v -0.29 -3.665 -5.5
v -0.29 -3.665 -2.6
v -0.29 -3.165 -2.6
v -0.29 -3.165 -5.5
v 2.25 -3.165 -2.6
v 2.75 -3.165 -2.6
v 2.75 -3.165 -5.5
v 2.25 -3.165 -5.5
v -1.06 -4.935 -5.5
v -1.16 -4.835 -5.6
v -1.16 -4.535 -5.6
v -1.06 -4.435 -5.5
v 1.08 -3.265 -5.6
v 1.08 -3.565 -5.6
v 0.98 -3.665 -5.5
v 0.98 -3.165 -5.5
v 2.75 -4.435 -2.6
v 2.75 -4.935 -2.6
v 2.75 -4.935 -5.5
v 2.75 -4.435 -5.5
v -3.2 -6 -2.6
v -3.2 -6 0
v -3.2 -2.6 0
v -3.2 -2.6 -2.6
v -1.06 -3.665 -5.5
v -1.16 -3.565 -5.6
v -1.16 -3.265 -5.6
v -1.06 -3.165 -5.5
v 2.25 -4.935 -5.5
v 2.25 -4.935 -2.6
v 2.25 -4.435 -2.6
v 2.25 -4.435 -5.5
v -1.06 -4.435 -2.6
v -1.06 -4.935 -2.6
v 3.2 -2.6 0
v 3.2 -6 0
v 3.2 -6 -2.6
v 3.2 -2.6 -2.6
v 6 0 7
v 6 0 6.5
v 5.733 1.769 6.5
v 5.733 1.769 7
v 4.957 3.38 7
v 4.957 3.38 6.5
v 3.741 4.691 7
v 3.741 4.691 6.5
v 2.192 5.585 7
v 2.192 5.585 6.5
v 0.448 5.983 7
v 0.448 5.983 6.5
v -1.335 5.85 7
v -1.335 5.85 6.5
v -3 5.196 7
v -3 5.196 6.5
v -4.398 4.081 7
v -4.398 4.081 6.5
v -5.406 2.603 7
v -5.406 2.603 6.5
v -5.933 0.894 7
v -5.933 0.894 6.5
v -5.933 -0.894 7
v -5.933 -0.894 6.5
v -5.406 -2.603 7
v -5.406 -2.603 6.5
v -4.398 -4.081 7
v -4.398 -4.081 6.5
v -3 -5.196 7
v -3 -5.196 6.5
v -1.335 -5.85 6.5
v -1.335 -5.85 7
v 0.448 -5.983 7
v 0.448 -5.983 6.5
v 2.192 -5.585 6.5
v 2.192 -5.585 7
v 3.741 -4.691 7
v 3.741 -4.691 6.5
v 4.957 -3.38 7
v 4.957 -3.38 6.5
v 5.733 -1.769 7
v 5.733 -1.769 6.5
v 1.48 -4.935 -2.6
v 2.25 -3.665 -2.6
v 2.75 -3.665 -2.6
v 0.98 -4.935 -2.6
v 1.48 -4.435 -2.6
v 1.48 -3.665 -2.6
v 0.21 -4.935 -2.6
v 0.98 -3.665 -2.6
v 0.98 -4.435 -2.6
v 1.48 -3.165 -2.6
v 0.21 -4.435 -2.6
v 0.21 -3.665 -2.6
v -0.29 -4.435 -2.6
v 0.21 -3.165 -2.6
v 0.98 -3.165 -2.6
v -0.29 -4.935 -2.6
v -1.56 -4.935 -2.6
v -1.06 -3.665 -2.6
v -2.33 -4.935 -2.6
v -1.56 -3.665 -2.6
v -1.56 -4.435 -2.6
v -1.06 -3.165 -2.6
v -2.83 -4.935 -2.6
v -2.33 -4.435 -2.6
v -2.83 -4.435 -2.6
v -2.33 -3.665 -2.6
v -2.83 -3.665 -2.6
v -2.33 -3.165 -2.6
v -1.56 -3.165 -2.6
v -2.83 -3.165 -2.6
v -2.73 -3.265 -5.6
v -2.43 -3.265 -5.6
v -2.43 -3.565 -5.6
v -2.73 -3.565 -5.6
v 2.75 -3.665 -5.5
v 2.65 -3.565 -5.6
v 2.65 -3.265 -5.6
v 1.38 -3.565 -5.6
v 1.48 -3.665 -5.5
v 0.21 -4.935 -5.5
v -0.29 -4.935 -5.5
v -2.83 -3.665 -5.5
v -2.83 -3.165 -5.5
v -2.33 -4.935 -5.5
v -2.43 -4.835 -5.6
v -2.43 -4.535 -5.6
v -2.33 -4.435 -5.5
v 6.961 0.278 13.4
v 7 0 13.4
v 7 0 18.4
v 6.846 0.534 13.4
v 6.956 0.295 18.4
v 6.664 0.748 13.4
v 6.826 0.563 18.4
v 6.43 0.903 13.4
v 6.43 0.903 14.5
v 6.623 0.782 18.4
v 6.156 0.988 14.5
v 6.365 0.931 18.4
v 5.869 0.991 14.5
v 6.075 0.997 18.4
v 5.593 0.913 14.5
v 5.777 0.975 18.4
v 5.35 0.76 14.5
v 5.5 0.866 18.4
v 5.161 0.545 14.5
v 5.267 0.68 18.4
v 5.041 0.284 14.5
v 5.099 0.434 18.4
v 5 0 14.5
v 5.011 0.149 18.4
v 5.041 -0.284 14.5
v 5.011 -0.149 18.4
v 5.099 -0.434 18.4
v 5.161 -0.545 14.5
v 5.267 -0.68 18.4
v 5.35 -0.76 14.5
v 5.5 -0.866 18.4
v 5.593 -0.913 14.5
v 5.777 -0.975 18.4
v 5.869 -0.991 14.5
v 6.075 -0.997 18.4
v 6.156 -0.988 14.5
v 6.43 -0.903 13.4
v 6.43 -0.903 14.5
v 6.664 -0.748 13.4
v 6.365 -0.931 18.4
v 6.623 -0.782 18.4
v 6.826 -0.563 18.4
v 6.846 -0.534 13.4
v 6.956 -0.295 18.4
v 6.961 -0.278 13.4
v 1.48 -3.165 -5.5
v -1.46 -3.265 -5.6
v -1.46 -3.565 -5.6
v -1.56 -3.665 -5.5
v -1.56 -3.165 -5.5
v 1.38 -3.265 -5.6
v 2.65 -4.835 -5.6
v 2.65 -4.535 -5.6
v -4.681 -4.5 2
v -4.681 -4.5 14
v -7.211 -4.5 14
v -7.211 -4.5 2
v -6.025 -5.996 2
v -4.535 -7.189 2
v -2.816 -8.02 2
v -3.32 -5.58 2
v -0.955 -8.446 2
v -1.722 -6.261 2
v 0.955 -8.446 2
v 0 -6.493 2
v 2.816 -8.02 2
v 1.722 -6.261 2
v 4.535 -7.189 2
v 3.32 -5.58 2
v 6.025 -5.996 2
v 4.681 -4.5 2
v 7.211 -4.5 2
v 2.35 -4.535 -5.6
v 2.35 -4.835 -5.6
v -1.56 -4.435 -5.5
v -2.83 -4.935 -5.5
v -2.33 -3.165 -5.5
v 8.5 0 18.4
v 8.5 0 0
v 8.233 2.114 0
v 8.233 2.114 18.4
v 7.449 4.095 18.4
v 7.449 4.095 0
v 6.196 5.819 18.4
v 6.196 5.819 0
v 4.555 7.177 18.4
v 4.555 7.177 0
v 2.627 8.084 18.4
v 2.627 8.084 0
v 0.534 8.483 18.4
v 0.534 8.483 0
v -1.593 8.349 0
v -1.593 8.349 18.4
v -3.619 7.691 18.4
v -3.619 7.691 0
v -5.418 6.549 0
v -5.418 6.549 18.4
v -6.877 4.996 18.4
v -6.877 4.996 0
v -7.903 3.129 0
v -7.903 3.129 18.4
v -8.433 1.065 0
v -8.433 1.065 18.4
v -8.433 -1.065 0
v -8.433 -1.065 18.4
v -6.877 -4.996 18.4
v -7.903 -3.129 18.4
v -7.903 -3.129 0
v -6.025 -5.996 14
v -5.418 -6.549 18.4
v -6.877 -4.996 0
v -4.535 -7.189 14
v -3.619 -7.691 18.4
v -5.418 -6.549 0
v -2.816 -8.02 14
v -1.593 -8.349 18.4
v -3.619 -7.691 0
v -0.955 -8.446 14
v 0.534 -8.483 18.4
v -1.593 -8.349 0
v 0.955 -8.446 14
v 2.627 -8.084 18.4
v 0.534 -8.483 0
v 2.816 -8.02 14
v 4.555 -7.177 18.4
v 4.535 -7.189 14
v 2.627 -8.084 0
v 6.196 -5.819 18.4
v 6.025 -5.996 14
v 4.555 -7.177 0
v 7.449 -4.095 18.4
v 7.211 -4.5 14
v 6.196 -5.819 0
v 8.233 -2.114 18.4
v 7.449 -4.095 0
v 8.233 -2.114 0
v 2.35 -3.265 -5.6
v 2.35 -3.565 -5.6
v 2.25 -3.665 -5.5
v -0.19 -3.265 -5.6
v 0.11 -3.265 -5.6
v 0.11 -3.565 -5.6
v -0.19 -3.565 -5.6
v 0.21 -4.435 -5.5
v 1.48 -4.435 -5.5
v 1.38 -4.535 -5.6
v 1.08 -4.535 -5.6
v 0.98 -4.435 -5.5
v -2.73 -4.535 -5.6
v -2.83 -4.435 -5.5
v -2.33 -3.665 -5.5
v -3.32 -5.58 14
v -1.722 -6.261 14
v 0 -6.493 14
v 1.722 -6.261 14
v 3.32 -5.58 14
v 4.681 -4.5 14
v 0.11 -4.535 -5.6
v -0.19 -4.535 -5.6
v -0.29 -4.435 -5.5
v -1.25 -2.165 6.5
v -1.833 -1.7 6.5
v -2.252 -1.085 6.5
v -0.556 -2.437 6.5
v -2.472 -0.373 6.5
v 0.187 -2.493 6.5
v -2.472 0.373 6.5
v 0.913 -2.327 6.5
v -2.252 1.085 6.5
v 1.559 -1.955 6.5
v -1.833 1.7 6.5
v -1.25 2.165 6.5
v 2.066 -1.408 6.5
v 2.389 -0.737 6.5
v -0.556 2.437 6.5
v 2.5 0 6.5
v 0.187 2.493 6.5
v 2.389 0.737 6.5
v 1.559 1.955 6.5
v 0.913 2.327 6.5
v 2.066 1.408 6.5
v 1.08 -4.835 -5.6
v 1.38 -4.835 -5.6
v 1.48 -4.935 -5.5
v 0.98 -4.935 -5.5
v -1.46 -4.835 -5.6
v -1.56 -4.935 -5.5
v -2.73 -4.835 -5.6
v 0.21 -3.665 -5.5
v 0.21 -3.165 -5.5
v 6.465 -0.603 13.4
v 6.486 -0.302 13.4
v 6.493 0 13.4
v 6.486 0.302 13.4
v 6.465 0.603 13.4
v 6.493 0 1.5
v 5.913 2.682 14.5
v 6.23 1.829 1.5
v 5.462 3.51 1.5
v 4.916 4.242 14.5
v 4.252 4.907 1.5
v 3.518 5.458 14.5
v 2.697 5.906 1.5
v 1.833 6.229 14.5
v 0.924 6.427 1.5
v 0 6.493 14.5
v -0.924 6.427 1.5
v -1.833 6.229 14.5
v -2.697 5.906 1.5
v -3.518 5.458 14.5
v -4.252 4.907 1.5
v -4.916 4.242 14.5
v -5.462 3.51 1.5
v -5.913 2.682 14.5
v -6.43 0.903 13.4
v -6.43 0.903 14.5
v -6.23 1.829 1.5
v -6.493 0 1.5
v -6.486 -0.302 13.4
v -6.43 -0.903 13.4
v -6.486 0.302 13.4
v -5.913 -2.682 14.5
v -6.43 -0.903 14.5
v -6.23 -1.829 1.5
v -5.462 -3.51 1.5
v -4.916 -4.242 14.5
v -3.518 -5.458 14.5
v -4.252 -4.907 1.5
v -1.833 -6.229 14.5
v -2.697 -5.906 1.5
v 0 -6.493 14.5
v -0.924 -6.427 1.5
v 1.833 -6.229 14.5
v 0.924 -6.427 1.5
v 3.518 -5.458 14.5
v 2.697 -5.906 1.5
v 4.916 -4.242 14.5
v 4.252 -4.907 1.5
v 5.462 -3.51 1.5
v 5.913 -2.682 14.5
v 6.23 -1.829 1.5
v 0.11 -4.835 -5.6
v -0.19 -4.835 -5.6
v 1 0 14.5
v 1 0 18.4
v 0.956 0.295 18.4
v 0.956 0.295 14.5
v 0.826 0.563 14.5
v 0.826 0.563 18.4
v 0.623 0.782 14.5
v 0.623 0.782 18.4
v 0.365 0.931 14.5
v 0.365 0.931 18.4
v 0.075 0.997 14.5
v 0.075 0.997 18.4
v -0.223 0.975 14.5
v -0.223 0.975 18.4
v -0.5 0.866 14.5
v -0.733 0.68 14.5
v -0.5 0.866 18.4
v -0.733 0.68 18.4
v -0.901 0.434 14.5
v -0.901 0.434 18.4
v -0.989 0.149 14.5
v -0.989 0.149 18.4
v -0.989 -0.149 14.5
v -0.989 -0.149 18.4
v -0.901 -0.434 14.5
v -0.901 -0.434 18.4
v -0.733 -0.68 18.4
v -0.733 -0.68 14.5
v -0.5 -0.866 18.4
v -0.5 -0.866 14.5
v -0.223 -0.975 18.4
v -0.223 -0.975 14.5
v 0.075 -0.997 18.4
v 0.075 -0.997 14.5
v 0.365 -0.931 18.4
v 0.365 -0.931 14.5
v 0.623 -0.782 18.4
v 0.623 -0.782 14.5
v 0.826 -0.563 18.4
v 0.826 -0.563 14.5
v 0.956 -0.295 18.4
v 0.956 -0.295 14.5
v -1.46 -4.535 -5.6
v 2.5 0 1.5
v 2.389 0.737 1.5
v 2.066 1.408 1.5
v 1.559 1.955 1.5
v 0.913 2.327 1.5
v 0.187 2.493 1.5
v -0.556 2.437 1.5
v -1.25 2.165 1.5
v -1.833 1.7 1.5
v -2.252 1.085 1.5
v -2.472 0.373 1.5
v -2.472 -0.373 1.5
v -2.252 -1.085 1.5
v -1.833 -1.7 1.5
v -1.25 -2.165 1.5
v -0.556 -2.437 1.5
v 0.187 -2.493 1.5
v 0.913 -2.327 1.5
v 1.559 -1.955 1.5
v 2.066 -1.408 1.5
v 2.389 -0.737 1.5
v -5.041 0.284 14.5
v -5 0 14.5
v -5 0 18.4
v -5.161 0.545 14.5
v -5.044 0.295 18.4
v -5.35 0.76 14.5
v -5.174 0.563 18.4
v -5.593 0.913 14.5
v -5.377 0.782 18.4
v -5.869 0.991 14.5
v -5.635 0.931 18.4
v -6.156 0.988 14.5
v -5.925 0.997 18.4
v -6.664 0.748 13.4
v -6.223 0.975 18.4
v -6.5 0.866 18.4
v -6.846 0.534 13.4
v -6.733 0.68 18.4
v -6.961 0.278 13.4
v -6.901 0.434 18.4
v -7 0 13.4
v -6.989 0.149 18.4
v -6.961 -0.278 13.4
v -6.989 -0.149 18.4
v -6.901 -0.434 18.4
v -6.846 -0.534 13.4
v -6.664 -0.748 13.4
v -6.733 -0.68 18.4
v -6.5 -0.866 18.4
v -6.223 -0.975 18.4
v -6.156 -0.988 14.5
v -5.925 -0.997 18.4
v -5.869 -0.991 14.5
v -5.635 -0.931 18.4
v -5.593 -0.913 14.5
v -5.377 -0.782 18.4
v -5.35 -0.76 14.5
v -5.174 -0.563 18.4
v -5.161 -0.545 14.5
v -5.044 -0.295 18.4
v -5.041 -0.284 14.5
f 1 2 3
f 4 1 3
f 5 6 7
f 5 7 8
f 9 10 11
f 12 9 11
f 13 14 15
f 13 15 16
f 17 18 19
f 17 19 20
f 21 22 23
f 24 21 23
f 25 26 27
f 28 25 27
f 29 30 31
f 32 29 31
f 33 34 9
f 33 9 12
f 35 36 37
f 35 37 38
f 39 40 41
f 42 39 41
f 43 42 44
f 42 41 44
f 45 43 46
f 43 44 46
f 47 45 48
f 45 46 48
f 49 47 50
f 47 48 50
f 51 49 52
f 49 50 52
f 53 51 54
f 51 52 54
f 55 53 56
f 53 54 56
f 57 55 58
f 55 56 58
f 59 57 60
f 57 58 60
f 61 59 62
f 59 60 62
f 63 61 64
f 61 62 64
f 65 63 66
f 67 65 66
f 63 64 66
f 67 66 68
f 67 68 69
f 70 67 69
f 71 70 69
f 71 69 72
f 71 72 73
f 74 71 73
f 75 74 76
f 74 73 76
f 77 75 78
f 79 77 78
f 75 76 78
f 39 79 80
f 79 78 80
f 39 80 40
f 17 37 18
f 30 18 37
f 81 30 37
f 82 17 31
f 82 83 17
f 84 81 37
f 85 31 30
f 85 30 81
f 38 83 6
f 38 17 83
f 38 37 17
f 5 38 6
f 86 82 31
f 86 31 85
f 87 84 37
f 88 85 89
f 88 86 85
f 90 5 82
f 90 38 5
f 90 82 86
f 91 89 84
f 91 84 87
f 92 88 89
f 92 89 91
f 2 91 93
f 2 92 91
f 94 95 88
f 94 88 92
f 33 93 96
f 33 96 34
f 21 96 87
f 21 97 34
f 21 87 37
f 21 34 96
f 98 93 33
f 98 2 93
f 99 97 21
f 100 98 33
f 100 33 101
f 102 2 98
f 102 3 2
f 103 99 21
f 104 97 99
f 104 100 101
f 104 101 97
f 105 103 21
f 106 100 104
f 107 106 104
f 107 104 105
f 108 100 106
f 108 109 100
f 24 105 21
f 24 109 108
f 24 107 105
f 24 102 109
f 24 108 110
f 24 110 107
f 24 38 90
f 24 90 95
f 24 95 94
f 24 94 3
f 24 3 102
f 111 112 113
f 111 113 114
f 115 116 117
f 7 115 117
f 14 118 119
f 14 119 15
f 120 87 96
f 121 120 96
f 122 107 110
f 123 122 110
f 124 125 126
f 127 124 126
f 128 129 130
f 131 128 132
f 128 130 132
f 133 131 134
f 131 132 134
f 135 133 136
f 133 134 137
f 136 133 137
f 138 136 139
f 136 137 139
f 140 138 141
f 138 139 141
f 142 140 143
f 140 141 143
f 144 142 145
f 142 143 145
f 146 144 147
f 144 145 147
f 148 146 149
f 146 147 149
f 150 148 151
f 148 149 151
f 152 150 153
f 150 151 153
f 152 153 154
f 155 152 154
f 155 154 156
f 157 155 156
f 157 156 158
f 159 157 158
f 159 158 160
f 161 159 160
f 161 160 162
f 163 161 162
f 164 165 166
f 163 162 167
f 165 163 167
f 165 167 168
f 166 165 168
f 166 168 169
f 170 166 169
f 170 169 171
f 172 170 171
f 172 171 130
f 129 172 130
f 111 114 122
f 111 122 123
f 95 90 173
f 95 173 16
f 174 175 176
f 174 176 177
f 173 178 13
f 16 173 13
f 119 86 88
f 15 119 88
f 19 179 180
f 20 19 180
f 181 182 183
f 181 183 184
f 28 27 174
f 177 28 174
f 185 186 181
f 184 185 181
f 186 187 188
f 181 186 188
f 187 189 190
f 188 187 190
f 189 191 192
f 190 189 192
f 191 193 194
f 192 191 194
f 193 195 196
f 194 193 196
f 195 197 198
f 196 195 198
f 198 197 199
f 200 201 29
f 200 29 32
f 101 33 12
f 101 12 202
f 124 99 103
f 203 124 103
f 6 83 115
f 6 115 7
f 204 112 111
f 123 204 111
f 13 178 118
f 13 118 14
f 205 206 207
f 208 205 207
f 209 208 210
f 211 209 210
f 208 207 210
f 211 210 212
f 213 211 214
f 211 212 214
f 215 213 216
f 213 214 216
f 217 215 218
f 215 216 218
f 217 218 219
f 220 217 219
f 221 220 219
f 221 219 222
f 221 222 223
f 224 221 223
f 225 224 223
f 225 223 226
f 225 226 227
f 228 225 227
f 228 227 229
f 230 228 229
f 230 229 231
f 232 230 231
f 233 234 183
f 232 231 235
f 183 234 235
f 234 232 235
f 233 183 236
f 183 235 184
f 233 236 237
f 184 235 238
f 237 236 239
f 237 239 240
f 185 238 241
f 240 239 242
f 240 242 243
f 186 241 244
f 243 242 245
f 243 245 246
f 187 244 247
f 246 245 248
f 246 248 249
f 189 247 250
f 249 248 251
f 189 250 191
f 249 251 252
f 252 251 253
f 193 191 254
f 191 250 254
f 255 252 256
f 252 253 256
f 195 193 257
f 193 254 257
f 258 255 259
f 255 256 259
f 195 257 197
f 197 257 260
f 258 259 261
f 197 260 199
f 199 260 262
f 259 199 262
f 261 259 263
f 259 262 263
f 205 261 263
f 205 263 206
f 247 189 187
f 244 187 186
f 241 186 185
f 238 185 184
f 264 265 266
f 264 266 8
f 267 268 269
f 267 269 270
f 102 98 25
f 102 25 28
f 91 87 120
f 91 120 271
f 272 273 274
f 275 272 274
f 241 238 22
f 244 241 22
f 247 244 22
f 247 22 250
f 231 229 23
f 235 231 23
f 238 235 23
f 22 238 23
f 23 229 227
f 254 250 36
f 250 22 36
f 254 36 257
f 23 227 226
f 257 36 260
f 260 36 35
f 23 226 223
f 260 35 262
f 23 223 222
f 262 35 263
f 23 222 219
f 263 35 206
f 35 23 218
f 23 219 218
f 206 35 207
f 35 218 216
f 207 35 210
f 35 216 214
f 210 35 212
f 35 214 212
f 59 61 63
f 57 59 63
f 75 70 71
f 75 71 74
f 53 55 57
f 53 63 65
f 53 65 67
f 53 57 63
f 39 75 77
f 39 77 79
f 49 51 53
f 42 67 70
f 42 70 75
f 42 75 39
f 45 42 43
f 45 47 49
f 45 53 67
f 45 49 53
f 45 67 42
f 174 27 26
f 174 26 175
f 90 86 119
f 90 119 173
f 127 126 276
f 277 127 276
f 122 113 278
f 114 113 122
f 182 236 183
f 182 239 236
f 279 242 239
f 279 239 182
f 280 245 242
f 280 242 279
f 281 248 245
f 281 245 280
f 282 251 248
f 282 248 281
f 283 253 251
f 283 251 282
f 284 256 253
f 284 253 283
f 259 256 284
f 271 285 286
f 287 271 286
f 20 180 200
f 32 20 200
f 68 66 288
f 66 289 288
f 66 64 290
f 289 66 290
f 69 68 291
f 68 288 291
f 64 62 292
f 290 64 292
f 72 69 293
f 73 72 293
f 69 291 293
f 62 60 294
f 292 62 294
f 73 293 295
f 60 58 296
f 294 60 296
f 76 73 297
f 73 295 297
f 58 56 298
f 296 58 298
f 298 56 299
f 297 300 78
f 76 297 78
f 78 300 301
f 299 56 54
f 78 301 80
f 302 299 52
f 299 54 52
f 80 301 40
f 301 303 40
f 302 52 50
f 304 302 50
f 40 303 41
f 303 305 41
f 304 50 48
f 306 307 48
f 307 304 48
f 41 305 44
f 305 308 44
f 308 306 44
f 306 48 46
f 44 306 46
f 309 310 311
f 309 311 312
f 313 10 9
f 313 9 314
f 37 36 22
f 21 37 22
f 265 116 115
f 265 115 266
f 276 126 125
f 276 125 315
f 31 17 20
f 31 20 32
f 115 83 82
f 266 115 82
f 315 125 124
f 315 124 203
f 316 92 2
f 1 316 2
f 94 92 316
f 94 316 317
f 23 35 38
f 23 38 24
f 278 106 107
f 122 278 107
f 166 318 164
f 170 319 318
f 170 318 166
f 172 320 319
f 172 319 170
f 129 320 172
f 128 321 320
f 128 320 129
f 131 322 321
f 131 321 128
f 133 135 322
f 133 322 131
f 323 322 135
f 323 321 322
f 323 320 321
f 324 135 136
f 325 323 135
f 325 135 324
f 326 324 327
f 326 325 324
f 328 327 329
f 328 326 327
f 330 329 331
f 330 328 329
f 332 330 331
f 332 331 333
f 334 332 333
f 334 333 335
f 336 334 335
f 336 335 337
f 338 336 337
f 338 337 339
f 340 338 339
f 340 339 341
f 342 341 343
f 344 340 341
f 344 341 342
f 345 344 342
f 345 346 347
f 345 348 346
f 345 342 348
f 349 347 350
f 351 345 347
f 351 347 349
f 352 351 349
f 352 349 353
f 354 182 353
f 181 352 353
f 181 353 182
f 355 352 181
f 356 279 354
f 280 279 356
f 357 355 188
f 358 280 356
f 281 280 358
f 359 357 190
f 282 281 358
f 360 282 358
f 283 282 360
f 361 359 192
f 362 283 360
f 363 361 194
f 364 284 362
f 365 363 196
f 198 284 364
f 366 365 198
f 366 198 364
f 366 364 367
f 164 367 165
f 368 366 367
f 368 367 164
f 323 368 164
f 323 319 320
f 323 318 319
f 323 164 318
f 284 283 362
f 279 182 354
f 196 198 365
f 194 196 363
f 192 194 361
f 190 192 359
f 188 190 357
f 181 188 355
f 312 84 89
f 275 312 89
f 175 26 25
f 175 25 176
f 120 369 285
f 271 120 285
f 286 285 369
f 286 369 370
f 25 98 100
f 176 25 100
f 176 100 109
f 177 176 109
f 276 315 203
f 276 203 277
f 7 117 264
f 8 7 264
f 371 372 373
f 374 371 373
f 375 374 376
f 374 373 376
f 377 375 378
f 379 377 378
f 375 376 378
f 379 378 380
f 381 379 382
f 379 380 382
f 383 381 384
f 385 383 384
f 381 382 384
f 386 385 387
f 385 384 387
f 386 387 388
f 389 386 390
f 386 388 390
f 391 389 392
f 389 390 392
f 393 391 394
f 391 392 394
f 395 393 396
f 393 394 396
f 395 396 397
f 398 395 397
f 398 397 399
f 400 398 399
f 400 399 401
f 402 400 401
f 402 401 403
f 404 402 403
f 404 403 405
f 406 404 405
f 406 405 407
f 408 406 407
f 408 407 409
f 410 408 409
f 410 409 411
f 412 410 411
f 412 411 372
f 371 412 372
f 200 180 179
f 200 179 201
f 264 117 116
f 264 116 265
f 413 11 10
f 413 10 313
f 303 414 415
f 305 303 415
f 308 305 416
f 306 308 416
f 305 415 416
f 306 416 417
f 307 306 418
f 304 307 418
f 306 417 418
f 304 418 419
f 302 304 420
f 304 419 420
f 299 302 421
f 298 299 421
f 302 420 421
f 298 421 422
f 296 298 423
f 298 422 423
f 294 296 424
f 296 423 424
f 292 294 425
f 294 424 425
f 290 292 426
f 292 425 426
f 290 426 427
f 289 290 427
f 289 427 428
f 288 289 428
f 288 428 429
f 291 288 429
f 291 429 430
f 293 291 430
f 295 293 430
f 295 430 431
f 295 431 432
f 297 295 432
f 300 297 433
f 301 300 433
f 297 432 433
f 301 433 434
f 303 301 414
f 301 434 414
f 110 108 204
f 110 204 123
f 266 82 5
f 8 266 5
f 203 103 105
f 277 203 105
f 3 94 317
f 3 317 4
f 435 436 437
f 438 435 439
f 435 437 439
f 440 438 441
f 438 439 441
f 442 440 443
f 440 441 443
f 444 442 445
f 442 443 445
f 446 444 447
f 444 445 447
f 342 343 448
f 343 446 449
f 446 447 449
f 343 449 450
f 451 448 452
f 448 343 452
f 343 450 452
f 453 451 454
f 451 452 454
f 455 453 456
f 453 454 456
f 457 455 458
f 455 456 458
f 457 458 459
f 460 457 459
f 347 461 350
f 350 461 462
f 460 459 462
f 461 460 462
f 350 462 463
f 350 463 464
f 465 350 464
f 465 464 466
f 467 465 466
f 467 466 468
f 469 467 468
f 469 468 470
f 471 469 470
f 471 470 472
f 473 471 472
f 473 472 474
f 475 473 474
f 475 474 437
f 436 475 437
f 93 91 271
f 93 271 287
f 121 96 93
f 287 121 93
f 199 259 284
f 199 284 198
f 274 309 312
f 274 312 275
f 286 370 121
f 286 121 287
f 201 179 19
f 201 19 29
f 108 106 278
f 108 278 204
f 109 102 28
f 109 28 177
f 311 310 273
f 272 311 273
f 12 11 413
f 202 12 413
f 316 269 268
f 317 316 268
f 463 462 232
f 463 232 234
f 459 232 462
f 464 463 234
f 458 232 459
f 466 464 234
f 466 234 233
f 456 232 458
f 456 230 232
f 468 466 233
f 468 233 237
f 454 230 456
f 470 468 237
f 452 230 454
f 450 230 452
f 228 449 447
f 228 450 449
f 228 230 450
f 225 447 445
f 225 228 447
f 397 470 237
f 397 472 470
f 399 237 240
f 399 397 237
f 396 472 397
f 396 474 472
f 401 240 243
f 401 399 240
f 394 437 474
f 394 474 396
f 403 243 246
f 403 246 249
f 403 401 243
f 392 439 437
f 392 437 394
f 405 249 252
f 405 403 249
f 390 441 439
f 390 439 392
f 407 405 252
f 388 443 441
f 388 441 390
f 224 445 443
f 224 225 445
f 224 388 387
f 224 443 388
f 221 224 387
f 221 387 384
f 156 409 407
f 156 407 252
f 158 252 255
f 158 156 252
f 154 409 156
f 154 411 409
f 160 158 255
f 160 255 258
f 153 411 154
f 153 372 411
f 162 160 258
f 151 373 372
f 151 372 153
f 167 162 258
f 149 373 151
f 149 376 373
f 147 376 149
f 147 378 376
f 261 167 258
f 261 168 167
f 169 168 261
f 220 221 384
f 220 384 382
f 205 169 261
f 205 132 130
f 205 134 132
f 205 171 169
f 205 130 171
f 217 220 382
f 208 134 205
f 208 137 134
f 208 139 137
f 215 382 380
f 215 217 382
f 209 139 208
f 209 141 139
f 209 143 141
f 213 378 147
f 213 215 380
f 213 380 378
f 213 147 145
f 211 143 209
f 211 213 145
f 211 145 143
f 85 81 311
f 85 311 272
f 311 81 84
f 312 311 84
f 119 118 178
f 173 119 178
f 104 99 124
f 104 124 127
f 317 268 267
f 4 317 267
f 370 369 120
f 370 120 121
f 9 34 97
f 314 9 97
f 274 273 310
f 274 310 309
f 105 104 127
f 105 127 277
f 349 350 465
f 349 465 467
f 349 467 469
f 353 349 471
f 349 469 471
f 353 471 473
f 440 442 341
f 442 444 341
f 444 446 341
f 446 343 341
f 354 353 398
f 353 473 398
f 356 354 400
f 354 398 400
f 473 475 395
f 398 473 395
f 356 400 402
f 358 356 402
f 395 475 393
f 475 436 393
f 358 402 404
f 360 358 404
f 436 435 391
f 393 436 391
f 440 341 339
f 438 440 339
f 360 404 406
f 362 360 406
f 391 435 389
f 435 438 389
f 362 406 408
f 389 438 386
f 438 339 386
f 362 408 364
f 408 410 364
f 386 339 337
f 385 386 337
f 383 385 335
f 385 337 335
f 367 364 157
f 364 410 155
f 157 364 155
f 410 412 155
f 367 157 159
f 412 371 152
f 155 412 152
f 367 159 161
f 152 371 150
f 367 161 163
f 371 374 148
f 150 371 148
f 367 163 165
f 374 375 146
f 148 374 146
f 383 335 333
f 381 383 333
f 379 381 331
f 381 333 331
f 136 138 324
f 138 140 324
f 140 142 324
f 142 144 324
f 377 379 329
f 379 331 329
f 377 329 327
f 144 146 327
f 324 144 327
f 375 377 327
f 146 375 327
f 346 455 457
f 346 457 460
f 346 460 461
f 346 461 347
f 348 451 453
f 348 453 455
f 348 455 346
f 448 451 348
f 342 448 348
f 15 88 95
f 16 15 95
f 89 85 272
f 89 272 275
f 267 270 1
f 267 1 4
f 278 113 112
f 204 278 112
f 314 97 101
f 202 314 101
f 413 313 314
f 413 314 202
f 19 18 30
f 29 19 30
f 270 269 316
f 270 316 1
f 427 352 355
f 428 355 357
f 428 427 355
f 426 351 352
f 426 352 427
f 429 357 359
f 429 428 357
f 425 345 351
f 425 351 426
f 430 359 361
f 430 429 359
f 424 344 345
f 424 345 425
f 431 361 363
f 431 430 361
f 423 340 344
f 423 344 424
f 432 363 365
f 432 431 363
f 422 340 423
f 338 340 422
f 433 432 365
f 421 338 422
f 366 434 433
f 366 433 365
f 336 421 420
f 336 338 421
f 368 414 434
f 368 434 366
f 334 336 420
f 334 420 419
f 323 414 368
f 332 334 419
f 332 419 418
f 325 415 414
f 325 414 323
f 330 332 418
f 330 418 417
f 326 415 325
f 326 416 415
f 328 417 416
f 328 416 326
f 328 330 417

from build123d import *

# Parameters (mm, degrees)
ESQUISSE1_R                  = 8.5
BOSS_EXTRU_1_DEPTH           = 18.4
ESQUISSE2_W                  = 6.4
ESQUISSE2_H                  = 3.4
BOSS_EXTRU_2_DEPTH           = 2.6
ESQUISSE3_W                  = 0.5
ESQUISSE3_H                  = 0.5
BOSS_EXTRU_3_DEPTH           = 3
CHANFREIN1_SIZE              = 0.1
ESQUISSE4_W                  = 12
ESQUISSE4_H                  = 4
ENL_V_MAT_EXTRU_1_DEPTH      = 27.453922204
ESQUISSE5_R                  = 1
ENL_V_MAT_EXTRU_2_DEPTH      = 5
ENL_V_MAT_EXTRU_3_DEPTH      = 12.5
ENL_V_MAT_EXTRU_3_DEPTH_BACK = 0.5
ESQUISSE6_R                  = 6.493106385
ESQUISSE7_R                  = 2.5
BOSS_EXTRU_4_DEPTH           = 5
ESQUISSE8_R                  = 6
BOSS_EXTRU_5_DEPTH           = 0.5
ESQUISSE10_R                 = 1
ENL_V_MAT_EXTRU_4_DEPTH      = 10


with BuildPart() as part:
    # Esquisse1 → Boss.-Extru.1 (new body)
    with BuildSketch(Plane.XY):
        Circle(ESQUISSE1_R)
    extrude(amount=BOSS_EXTRU_1_DEPTH)

    # Esquisse2 → Boss.-Extru.2 (add)
    with BuildSketch(Plane(origin=(0, 0, 0), x_dir=(-1, 0, 0), z_dir=(0, 0, -1))):
        with Locations((0, -4.3)):
            Rectangle(ESQUISSE2_W, ESQUISSE2_H)
    extrude(amount=BOSS_EXTRU_2_DEPTH)

    # Esquisse3 → Boss.-Extru.3 (add)
    with BuildSketch(Plane(origin=(0, 0, -2.6), x_dir=(-1, 0, 0), z_dir=(0, 0, -1))):
        with Locations((-1.23, -3.415159268)):
            Rectangle(ESQUISSE3_W, ESQUISSE3_H)
        with Locations((-2.5, -3.415159268)):
            Rectangle(ESQUISSE3_W, ESQUISSE3_H)
        with Locations((0.04, -3.415159268)):
            Rectangle(ESQUISSE3_W, ESQUISSE3_H)
        with Locations((1.31, -3.415159268)):
            Rectangle(ESQUISSE3_W, ESQUISSE3_H)
        with Locations((2.58, -3.415159268)):
            Rectangle(ESQUISSE3_W, ESQUISSE3_H)
        with Locations((-2.5, -4.685159268)):
            Rectangle(ESQUISSE3_W, ESQUISSE3_H)
        with Locations((-1.23, -4.685159268)):
            Rectangle(ESQUISSE3_W, ESQUISSE3_H)
        with Locations((0.04, -4.685159268)):
            Rectangle(ESQUISSE3_W, ESQUISSE3_H)
        with Locations((1.31, -4.685159268)):
            Rectangle(ESQUISSE3_W, ESQUISSE3_H)
        with Locations((2.58, -4.685159268)):
            Rectangle(ESQUISSE3_W, ESQUISSE3_H)
    extrude(amount=BOSS_EXTRU_3_DEPTH)

    # Chanfrein1
    chanfrein1_edges = [part.edges().sort_by_distance(p)[0] for p in [
        (-1.06, -4.685159268, -5.6),
        (-1.31, -4.935159268, -5.6),
        (-1.56, -4.685159268, -5.6),
        (-1.31, -4.435159268, -5.6),
        (-2.33, -4.685159268, -5.6),
        (-2.58, -4.935159268, -5.6),
        (-2.83, -4.685159268, -5.6),
        (-2.58, -4.435159268, -5.6),
        (2.75, -3.415159268, -5.6),
        (2.5, -3.665159268, -5.6),
        (2.25, -3.415159268, -5.6),
        (2.5, -3.165159268, -5.6),
        (1.48, -3.415159268, -5.6),
        (1.23, -3.665159268, -5.6),
        (0.98, -3.415159268, -5.6),
        (1.23, -3.165159268, -5.6),
        (0.21, -3.415159268, -5.6),
        (-0.04, -3.665159268, -5.6),
        (-0.29, -3.415159268, -5.6),
        (-0.04, -3.165159268, -5.6),
        (-1.06, -3.415159268, -5.6),
        (-1.31, -3.665159268, -5.6),
        (-1.56, -3.415159268, -5.6),
        (-1.31, -3.165159268, -5.6),
        (-2.33, -3.415159268, -5.6),
        (-2.58, -3.665159268, -5.6),
        (-2.83, -3.415159268, -5.6),
        (-2.58, -3.165159268, -5.6),
        (2.75, -4.685159268, -5.6),
        (2.5, -4.935159268, -5.6),
        (2.25, -4.685159268, -5.6),
        (2.5, -4.435159268, -5.6),
        (1.48, -4.685159268, -5.6),
        (1.23, -4.935159268, -5.6),
        (0.98, -4.685159268, -5.6),
        (1.23, -4.435159268, -5.6),
        (0.21, -4.685159268, -5.6),
        (-0.04, -4.935159268, -5.6),
        (-0.29, -4.685159268, -5.6),
        (-0.04, -4.435159268, -5.6),
    ]]
    chamfer(chanfrein1_edges, length=CHANFREIN1_SIZE)

    # Esquisse4 → Enlèv. mat.-Extru.1 (cut, through all)
    with BuildSketch(Plane(origin=(8.5, 0, 0), x_dir=(0, 0, -1), z_dir=(1, 0, 0))):
        with Locations((-8, -6.5)):
            Rectangle(ESQUISSE4_W, ESQUISSE4_H)
    extrude(amount=-ENL_V_MAT_EXTRU_1_DEPTH, mode=Mode.SUBTRACT)

    # Esquisse5 → Enlèv. mat.-Extru.2 (cut)
    with BuildSketch(Plane.XY.offset(18.4)):
        with Locations((-6, 0)):
            Circle(ESQUISSE5_R)
        with Locations((6, 0)):
            Circle(ESQUISSE5_R)
    extrude(amount=-ENL_V_MAT_EXTRU_2_DEPTH, mode=Mode.SUBTRACT)

    # Esquisse6 → Enlèv. mat.-Extru.3 (cut, two sides: drawn at the far end of the back side and taken through both)
    with BuildSketch(Plane.XY.offset(2).offset(-ENL_V_MAT_EXTRU_3_DEPTH_BACK)):
        Circle(ESQUISSE6_R)
    extrude(amount=ENL_V_MAT_EXTRU_3_DEPTH + ENL_V_MAT_EXTRU_3_DEPTH_BACK, mode=Mode.SUBTRACT)

    # Esquisse7 → Boss.-Extru.4 (add)
    with BuildSketch(Plane.XY.offset(1.5)):
        Circle(ESQUISSE7_R)
    extrude(amount=BOSS_EXTRU_4_DEPTH)

    # Esquisse8 → Boss.-Extru.5 (add)
    with BuildSketch(Plane.XY.offset(6.5)):
        Circle(ESQUISSE8_R)
    extrude(amount=BOSS_EXTRU_5_DEPTH)

    # Esquisse10 → Enlèv. mat.-Extru.4 (cut)
    with BuildSketch(Plane.XY.offset(18.4)):
        Circle(ESQUISSE10_R)
    extrude(amount=-ENL_V_MAT_EXTRU_4_DEPTH, mode=Mode.SUBTRACT)


solid = part.part
